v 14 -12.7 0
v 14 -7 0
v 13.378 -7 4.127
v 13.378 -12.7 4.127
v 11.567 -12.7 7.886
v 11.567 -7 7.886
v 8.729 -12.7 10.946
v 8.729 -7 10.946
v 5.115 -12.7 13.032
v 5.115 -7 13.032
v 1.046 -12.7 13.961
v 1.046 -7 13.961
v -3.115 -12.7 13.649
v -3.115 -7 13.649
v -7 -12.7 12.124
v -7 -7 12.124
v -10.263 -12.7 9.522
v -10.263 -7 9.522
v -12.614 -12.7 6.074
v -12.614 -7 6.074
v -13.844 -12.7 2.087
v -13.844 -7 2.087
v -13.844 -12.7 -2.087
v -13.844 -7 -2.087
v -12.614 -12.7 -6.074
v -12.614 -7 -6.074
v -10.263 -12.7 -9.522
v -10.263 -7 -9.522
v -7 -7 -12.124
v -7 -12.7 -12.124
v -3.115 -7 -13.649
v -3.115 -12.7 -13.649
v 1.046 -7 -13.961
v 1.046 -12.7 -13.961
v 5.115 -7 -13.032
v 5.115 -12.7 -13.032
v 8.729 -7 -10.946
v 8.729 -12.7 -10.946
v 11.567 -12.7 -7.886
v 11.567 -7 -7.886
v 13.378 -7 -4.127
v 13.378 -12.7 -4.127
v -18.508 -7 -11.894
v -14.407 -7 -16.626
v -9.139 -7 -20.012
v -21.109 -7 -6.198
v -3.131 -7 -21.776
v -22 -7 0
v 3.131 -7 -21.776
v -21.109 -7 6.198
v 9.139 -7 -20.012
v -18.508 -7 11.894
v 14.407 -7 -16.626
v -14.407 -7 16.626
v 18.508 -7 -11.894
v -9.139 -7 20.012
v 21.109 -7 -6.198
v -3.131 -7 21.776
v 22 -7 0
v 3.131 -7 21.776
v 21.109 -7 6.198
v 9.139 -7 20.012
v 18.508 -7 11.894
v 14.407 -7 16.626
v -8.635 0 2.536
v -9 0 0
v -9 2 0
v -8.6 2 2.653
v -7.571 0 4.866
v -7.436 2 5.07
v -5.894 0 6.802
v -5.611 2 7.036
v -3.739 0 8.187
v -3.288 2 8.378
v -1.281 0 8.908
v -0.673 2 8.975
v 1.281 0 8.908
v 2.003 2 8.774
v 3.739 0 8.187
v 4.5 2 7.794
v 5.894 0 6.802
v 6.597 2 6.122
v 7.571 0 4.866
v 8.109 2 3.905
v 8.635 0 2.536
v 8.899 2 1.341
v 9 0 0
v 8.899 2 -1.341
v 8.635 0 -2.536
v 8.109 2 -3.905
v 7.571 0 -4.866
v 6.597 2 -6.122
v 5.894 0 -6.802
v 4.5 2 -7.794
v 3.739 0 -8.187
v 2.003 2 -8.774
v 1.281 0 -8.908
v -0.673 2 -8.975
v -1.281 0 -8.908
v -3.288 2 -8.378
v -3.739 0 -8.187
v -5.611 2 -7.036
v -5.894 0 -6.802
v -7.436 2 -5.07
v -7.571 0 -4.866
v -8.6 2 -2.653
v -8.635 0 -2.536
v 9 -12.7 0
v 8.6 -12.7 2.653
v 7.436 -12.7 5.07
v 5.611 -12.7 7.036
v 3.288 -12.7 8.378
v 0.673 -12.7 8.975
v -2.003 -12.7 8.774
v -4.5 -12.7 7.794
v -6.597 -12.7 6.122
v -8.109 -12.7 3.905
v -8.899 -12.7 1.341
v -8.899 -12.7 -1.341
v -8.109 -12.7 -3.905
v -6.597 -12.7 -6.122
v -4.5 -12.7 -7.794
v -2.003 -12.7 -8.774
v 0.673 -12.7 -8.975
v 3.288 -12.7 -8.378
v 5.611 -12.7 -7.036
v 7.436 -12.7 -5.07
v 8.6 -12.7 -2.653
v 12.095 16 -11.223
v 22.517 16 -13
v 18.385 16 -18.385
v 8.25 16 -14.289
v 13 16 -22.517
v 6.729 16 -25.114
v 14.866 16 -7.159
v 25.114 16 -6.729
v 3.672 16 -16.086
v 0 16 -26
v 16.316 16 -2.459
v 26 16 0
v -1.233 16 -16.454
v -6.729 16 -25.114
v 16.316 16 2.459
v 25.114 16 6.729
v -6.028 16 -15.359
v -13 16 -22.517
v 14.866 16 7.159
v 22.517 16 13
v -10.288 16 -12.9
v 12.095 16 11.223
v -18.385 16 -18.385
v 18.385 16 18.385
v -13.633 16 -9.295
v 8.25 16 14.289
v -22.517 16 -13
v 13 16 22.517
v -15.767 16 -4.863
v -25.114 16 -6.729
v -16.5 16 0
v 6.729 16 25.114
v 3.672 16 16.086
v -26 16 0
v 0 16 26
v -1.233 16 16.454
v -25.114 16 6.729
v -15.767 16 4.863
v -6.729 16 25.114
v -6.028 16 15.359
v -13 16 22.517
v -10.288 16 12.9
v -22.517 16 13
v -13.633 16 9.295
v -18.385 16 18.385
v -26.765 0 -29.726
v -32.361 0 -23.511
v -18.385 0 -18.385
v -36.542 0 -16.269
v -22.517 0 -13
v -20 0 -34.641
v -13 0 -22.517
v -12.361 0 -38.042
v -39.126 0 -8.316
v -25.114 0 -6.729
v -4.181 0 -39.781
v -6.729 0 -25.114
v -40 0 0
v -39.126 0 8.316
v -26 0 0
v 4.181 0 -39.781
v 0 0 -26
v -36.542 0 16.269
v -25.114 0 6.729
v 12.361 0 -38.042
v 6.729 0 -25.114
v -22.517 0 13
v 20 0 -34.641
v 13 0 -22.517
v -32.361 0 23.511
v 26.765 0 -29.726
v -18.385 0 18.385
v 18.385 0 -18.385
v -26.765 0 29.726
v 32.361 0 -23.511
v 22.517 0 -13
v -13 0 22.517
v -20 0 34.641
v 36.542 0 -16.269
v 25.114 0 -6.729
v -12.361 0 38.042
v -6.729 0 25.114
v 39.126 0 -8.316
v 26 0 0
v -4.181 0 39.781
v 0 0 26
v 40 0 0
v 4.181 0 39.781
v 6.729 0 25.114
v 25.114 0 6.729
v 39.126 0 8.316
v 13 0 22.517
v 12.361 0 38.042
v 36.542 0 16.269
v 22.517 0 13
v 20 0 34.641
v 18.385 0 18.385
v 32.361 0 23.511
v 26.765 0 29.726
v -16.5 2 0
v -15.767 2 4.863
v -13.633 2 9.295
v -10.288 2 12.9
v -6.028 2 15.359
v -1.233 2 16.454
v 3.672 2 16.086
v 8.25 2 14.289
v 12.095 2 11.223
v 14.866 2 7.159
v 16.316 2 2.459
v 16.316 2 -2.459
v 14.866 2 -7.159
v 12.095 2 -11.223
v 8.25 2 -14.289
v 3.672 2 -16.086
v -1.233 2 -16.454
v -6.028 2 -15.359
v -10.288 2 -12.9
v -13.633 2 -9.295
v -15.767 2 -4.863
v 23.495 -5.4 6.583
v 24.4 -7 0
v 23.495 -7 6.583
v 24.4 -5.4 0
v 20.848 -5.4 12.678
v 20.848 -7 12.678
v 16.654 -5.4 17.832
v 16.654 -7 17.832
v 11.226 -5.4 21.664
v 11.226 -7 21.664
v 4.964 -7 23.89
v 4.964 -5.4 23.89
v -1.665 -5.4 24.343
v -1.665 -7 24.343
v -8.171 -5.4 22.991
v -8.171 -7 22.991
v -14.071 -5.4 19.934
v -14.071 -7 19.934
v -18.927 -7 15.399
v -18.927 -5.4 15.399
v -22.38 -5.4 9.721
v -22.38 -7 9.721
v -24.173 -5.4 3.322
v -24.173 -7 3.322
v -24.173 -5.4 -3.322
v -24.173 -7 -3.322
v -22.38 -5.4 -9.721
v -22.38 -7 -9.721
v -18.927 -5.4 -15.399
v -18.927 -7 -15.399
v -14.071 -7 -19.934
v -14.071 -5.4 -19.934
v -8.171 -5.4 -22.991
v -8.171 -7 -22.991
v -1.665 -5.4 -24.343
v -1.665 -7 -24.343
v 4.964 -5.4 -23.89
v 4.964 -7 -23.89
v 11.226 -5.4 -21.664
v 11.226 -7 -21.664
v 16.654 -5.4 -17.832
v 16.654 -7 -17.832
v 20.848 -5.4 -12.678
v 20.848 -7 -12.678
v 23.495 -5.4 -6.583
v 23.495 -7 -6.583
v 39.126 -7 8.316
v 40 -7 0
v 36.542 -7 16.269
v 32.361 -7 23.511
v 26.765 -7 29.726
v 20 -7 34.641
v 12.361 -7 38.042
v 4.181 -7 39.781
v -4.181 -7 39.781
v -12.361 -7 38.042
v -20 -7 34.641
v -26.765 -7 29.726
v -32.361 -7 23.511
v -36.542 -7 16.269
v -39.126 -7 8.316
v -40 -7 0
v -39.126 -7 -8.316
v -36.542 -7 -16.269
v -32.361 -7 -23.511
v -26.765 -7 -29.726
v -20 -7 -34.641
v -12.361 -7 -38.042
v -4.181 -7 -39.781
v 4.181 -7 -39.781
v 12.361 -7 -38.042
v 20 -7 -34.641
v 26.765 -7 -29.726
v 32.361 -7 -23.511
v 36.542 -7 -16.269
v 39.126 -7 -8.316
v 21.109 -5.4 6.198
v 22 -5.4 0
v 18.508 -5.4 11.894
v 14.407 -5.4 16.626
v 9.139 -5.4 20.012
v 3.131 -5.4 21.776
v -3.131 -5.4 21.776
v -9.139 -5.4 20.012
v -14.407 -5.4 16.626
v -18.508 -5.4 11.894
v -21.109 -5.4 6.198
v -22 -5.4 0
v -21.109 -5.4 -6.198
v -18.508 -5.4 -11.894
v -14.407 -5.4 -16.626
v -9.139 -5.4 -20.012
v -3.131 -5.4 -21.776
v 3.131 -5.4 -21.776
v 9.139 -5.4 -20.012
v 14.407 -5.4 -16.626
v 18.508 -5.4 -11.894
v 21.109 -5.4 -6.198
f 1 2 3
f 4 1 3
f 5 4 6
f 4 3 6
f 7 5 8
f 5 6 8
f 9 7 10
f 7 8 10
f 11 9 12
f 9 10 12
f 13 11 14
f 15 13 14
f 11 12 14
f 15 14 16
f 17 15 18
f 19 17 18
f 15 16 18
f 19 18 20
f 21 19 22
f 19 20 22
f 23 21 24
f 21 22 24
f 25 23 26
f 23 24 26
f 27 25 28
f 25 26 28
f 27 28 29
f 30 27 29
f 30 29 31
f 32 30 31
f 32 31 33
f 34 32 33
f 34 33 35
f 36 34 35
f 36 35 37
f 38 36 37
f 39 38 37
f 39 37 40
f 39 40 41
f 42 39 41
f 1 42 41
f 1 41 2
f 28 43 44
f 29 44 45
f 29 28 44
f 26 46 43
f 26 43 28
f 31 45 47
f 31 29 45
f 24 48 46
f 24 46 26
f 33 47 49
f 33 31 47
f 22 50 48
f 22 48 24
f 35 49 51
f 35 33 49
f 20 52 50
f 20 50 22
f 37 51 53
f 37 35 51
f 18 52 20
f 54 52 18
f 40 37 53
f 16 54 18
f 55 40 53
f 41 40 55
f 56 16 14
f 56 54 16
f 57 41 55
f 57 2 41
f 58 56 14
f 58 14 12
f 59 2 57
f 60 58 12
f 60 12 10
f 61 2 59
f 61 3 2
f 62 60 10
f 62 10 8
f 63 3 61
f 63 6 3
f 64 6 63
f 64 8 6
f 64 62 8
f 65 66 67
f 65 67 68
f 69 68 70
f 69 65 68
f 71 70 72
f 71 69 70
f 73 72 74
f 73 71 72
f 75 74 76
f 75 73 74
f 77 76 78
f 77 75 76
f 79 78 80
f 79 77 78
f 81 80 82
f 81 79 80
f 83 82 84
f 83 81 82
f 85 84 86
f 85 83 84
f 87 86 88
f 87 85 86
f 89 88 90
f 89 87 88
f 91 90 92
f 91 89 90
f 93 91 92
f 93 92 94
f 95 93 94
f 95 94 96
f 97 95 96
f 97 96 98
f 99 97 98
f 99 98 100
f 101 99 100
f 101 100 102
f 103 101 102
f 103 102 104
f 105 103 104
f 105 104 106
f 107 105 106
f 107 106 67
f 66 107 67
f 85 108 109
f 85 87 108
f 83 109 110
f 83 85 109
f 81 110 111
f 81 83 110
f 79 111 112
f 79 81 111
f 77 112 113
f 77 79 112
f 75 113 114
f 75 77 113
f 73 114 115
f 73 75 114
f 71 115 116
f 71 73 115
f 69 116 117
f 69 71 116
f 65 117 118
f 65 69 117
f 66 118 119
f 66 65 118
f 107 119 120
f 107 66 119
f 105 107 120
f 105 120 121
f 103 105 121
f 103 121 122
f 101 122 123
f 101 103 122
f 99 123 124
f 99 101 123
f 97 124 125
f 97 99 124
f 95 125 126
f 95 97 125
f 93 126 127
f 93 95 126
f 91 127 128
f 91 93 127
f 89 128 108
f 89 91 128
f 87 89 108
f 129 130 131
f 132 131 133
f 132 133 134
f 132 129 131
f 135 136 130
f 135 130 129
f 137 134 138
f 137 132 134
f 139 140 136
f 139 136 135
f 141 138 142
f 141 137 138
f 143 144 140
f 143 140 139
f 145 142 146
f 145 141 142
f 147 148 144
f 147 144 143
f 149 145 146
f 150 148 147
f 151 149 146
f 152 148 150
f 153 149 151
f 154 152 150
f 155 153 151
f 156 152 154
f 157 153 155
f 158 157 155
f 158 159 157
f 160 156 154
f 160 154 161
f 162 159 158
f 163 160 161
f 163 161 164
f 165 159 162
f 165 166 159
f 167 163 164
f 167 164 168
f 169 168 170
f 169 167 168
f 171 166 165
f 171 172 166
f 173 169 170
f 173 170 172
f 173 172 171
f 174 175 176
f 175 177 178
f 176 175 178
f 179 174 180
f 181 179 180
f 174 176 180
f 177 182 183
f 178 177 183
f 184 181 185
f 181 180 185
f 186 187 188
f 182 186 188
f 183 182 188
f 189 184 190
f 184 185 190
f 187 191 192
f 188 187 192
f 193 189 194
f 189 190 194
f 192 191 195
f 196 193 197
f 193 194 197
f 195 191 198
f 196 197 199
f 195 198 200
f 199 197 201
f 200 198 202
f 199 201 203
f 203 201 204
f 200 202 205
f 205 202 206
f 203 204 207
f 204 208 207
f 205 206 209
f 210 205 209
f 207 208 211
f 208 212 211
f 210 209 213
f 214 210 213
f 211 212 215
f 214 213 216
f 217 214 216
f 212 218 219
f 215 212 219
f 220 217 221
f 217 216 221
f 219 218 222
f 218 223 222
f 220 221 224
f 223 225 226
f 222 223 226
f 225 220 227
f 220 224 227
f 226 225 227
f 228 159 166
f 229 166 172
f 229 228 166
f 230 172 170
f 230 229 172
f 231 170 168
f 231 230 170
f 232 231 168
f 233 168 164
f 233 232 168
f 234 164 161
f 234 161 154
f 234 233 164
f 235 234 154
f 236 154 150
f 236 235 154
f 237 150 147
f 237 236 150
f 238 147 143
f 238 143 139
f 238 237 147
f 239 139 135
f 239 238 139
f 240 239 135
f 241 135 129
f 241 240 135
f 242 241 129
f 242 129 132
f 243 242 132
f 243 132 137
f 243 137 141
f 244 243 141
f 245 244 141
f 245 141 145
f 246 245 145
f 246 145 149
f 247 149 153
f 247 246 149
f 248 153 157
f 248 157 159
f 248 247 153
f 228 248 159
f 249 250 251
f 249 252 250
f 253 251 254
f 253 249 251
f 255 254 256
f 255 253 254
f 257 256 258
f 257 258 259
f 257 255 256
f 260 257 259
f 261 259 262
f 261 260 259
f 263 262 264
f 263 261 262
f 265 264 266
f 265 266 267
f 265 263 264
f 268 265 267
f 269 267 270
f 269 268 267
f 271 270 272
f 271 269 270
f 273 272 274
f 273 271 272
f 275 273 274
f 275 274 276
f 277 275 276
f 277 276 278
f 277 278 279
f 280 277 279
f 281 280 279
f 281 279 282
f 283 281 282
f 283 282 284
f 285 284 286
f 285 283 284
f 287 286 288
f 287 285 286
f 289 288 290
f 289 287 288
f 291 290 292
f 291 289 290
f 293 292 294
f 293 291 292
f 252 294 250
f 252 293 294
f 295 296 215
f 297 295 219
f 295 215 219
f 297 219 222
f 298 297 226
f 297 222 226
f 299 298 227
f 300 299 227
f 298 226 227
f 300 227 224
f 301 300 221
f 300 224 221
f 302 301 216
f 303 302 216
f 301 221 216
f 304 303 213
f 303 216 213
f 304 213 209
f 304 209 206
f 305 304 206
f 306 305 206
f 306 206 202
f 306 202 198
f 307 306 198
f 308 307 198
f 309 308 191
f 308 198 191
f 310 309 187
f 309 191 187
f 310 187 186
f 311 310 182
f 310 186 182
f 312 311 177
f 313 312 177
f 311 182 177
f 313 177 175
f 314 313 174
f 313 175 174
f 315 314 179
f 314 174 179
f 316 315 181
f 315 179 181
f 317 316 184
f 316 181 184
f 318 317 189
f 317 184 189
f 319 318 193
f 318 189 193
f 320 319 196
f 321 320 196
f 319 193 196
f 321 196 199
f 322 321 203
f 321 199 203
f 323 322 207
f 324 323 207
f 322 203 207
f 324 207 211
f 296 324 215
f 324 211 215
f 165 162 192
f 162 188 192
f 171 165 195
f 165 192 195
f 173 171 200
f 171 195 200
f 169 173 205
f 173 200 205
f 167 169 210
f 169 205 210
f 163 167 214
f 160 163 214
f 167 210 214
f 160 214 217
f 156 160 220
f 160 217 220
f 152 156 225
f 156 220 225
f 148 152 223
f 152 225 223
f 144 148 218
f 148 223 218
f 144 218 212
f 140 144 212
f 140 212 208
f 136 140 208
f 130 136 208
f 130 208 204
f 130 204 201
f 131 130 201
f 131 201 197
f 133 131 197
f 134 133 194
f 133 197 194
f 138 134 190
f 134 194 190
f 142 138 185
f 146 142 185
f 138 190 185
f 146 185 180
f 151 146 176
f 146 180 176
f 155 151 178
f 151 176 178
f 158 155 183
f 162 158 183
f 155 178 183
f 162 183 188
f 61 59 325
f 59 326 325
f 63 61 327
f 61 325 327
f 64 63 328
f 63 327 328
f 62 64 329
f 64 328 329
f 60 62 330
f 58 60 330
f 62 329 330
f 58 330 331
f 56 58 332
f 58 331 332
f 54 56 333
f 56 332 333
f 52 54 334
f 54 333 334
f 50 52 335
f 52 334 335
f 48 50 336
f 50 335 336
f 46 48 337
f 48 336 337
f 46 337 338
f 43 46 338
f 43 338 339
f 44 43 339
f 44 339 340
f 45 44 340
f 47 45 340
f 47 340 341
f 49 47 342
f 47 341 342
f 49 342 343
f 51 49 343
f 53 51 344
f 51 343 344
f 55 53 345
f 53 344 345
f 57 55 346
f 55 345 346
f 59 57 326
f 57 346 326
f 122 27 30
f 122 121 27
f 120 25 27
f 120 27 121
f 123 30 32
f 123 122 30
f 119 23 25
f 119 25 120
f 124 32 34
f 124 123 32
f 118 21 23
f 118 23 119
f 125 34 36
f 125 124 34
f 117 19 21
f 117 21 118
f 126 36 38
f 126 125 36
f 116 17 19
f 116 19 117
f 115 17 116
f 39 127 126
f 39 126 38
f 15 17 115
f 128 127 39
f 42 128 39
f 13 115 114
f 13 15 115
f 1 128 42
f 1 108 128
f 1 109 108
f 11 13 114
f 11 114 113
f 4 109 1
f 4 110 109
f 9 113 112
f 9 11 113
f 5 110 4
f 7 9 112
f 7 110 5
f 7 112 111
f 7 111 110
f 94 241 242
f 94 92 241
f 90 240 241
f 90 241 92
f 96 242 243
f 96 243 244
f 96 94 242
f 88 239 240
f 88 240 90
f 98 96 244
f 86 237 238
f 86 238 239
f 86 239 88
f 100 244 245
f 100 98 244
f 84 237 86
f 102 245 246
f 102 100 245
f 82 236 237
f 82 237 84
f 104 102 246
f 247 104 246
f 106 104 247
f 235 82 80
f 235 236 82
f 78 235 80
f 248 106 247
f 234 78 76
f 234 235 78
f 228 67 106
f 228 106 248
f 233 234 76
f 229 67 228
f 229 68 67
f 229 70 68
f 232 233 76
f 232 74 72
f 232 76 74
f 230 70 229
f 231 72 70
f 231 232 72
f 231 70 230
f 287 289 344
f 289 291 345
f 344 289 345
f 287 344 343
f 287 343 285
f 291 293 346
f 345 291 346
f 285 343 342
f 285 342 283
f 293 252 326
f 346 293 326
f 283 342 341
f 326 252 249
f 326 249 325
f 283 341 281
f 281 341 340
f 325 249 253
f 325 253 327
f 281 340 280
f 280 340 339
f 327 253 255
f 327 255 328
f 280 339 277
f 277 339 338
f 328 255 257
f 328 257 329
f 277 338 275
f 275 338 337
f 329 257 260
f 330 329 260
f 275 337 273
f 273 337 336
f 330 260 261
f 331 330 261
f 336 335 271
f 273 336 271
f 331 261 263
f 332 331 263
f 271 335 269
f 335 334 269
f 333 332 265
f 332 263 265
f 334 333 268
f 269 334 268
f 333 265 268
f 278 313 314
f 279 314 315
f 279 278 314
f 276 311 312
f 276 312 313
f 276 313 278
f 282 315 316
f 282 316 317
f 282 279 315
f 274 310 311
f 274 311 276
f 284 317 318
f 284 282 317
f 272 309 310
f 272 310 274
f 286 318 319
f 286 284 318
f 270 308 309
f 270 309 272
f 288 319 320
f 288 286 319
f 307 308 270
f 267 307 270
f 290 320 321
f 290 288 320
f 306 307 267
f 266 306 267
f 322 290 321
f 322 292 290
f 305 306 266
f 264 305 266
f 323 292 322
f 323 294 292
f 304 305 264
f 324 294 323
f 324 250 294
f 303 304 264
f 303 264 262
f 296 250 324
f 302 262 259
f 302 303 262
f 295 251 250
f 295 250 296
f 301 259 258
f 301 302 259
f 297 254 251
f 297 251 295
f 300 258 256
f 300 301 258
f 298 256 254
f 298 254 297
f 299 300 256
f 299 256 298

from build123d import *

# Parameters (mm, degrees)
F0_R      = 40
F0_R_2    = 9
F1_DEPTH  = 7
F2_R      = 14
F2_R_2    = 9
F3_DEPTH  = 10
F4_R      = 12.5
F5_DEPTH  = 4.2
F6_R      = 26
F6_R_2    = 9
F7_DEPTH  = 2
F8_R      = 26
F8_R_2    = 16.5
F9_DEPTH  = 14
F11_R     = 14
F12_DEPTH = 4.3
F13_W     = 2.4
F13_H     = 1.6


with BuildPart() as f1:
    # F0 (on Front) → F1 (new body)
    with BuildSketch(Plane.XZ):
        Circle(F0_R)
        Circle(F0_R_2, mode=Mode.SUBTRACT)
    extrude(amount=F1_DEPTH)

    # F2 (on face) → F3 (join)
    with BuildSketch(Plane.XZ.offset(7)):
        Circle(F2_R)
        Circle(F2_R_2, mode=Mode.SUBTRACT)
    extrude(amount=F3_DEPTH)

    # F4 (on face) → F5 (cut)
    with BuildSketch(Plane.XZ.offset(17)):
        Circle(F4_R)
    extrude(amount=-F5_DEPTH, mode=Mode.SUBTRACT)

    # F6 (on face) → F7 (join)
    with BuildSketch(Plane(origin=(0, 0, 0), x_dir=(-1, 0, 0), z_dir=(0, 1, 0))):
        Circle(F6_R)
        Circle(F6_R_2, mode=Mode.SUBTRACT)
    extrude(amount=F7_DEPTH)

    # F8 (on face) → F9 (join)
    with BuildSketch(Plane(origin=(0, 2, 0), x_dir=(-1, 0, 0), z_dir=(0, 1, 0))):
        Circle(F8_R)
        Circle(F8_R_2, mode=Mode.SUBTRACT)
    extrude(amount=F9_DEPTH)

    # F11 (on face) → F12 (cut)
    with BuildSketch(Plane.XZ.offset(17)):
        Circle(F11_R)
    extrude(amount=-F12_DEPTH, mode=Mode.SUBTRACT)

    # F13 (on Top) → F16 (revolve, cut)
    with BuildSketch(Plane.XY):
        with Locations((23.2, -6.2)):
            Rectangle(F13_W, F13_H)
    revolve(axis=Axis((0, -7, 0), (0, -1, 0)), mode=Mode.SUBTRACT)


with BuildPart() as f14_1:
    # F14: copy of F1
    add(f1.part.moved(Location((0, 0, 110.7))))


solid = f1.part
